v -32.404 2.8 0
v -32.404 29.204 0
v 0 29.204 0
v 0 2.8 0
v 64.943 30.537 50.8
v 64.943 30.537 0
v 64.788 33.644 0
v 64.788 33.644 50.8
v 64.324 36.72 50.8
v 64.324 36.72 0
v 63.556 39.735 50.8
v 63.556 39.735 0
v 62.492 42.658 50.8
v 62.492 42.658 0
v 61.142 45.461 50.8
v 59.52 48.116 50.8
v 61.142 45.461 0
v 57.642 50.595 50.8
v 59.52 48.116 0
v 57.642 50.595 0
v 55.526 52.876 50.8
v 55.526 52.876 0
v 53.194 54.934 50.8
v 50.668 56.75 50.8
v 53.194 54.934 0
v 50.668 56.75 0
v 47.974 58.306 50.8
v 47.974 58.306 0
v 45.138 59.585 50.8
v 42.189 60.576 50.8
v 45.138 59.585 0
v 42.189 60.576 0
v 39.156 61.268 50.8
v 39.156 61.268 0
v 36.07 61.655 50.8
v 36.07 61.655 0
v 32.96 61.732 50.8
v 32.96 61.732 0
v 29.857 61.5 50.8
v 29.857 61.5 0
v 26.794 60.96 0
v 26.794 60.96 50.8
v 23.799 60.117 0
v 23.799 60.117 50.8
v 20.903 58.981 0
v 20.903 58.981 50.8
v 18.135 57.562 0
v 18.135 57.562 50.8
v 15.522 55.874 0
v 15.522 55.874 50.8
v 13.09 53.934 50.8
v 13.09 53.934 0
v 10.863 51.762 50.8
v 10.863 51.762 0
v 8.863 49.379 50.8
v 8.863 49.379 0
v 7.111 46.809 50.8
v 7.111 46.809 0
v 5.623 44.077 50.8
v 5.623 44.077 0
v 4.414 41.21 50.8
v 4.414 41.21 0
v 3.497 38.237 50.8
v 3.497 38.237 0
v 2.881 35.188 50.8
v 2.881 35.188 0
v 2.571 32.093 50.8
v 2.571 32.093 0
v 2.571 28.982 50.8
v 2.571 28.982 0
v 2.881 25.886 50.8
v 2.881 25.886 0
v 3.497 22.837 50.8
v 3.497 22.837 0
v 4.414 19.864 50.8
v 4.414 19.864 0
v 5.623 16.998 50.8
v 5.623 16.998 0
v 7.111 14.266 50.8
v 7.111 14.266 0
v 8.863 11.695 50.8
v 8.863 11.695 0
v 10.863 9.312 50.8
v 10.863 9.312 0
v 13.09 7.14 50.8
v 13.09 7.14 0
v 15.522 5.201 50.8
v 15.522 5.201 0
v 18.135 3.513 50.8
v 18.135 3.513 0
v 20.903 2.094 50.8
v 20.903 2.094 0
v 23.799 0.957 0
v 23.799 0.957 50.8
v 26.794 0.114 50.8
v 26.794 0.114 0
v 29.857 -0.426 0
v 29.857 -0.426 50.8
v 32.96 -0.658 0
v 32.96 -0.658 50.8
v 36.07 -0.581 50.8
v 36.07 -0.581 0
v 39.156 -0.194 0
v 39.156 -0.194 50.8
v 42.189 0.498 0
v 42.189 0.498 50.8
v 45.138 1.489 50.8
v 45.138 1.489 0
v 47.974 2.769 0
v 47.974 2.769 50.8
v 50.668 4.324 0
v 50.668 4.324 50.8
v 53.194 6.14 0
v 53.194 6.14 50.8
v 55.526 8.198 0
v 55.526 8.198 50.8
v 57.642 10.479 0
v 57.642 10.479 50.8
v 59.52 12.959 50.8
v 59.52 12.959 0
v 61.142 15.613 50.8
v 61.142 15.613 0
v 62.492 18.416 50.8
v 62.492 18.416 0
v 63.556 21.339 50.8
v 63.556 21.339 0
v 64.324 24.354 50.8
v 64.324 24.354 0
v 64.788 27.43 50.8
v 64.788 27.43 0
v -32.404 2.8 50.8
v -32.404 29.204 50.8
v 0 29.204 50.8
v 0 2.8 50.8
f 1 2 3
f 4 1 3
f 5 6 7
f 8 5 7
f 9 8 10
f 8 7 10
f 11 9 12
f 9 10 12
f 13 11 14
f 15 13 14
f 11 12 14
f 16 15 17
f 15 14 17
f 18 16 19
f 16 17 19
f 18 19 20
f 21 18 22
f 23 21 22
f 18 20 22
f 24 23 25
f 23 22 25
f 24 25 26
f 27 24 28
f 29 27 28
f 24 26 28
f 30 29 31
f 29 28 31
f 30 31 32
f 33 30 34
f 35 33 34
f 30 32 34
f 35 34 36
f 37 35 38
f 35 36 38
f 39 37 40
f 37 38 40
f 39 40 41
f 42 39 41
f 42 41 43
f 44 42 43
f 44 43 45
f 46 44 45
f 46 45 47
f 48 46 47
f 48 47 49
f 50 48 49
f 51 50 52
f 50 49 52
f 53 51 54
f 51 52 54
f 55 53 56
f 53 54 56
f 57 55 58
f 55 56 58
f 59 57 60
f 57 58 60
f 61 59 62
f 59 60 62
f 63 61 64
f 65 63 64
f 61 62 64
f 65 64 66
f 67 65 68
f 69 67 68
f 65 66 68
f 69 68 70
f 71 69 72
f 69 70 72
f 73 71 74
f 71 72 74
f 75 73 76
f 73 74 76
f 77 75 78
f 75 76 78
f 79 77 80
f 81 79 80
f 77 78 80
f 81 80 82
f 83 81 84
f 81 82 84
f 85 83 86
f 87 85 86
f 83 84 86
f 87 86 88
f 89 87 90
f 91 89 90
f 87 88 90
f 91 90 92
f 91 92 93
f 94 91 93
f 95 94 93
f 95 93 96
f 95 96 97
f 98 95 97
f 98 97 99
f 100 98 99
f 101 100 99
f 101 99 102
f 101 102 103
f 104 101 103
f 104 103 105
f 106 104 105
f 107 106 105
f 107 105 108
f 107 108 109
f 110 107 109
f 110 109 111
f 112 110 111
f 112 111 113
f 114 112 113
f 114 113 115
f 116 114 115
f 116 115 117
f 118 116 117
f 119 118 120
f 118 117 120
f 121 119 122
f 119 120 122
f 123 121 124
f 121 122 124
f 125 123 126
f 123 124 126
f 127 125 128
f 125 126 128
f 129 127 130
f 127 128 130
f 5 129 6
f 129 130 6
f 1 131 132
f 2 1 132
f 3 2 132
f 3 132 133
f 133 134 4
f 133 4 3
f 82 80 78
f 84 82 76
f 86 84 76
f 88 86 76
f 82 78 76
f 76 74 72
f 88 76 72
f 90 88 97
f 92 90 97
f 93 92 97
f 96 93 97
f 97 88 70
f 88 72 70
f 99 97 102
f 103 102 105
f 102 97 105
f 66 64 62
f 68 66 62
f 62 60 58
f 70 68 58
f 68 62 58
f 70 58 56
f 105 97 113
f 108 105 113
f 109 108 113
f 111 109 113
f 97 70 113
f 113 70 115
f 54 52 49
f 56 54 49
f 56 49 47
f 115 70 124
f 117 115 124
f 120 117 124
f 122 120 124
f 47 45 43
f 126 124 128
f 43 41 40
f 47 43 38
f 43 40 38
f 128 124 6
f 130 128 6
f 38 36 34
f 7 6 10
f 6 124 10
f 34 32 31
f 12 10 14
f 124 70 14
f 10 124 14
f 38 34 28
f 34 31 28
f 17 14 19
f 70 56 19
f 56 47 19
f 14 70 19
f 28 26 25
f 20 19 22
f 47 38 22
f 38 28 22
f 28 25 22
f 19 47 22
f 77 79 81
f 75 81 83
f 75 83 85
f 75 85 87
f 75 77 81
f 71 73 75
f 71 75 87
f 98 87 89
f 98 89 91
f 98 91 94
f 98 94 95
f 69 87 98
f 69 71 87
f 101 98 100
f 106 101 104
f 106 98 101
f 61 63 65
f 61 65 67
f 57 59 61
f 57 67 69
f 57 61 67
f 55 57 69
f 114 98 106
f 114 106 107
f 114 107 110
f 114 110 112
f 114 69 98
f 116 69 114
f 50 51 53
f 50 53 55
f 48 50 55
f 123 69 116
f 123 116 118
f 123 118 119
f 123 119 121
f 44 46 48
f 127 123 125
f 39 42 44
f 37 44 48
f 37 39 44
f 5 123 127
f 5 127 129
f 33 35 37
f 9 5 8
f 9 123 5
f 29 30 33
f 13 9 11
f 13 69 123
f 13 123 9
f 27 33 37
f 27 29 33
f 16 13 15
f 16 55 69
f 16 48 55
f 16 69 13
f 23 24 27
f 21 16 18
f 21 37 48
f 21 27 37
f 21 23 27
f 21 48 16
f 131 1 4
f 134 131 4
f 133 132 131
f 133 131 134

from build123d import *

# Parameters (mm, degrees)
F0_W     = 32.40405
F0_H     = 26.403301
F0_R     = 31.205038
F1_DEPTH = 50.8


with BuildPart() as f1:
    # F0 (on Top) → F1 (new body)
    with BuildSketch(Plane.XY):
        with Locations((-16.202025, 16.002)):
            Rectangle(F0_W, F0_H)
        with Locations((33.737551, 30.537149)):
            Circle(F0_R)
    extrude(amount=F1_DEPTH)


solid = f1.part
